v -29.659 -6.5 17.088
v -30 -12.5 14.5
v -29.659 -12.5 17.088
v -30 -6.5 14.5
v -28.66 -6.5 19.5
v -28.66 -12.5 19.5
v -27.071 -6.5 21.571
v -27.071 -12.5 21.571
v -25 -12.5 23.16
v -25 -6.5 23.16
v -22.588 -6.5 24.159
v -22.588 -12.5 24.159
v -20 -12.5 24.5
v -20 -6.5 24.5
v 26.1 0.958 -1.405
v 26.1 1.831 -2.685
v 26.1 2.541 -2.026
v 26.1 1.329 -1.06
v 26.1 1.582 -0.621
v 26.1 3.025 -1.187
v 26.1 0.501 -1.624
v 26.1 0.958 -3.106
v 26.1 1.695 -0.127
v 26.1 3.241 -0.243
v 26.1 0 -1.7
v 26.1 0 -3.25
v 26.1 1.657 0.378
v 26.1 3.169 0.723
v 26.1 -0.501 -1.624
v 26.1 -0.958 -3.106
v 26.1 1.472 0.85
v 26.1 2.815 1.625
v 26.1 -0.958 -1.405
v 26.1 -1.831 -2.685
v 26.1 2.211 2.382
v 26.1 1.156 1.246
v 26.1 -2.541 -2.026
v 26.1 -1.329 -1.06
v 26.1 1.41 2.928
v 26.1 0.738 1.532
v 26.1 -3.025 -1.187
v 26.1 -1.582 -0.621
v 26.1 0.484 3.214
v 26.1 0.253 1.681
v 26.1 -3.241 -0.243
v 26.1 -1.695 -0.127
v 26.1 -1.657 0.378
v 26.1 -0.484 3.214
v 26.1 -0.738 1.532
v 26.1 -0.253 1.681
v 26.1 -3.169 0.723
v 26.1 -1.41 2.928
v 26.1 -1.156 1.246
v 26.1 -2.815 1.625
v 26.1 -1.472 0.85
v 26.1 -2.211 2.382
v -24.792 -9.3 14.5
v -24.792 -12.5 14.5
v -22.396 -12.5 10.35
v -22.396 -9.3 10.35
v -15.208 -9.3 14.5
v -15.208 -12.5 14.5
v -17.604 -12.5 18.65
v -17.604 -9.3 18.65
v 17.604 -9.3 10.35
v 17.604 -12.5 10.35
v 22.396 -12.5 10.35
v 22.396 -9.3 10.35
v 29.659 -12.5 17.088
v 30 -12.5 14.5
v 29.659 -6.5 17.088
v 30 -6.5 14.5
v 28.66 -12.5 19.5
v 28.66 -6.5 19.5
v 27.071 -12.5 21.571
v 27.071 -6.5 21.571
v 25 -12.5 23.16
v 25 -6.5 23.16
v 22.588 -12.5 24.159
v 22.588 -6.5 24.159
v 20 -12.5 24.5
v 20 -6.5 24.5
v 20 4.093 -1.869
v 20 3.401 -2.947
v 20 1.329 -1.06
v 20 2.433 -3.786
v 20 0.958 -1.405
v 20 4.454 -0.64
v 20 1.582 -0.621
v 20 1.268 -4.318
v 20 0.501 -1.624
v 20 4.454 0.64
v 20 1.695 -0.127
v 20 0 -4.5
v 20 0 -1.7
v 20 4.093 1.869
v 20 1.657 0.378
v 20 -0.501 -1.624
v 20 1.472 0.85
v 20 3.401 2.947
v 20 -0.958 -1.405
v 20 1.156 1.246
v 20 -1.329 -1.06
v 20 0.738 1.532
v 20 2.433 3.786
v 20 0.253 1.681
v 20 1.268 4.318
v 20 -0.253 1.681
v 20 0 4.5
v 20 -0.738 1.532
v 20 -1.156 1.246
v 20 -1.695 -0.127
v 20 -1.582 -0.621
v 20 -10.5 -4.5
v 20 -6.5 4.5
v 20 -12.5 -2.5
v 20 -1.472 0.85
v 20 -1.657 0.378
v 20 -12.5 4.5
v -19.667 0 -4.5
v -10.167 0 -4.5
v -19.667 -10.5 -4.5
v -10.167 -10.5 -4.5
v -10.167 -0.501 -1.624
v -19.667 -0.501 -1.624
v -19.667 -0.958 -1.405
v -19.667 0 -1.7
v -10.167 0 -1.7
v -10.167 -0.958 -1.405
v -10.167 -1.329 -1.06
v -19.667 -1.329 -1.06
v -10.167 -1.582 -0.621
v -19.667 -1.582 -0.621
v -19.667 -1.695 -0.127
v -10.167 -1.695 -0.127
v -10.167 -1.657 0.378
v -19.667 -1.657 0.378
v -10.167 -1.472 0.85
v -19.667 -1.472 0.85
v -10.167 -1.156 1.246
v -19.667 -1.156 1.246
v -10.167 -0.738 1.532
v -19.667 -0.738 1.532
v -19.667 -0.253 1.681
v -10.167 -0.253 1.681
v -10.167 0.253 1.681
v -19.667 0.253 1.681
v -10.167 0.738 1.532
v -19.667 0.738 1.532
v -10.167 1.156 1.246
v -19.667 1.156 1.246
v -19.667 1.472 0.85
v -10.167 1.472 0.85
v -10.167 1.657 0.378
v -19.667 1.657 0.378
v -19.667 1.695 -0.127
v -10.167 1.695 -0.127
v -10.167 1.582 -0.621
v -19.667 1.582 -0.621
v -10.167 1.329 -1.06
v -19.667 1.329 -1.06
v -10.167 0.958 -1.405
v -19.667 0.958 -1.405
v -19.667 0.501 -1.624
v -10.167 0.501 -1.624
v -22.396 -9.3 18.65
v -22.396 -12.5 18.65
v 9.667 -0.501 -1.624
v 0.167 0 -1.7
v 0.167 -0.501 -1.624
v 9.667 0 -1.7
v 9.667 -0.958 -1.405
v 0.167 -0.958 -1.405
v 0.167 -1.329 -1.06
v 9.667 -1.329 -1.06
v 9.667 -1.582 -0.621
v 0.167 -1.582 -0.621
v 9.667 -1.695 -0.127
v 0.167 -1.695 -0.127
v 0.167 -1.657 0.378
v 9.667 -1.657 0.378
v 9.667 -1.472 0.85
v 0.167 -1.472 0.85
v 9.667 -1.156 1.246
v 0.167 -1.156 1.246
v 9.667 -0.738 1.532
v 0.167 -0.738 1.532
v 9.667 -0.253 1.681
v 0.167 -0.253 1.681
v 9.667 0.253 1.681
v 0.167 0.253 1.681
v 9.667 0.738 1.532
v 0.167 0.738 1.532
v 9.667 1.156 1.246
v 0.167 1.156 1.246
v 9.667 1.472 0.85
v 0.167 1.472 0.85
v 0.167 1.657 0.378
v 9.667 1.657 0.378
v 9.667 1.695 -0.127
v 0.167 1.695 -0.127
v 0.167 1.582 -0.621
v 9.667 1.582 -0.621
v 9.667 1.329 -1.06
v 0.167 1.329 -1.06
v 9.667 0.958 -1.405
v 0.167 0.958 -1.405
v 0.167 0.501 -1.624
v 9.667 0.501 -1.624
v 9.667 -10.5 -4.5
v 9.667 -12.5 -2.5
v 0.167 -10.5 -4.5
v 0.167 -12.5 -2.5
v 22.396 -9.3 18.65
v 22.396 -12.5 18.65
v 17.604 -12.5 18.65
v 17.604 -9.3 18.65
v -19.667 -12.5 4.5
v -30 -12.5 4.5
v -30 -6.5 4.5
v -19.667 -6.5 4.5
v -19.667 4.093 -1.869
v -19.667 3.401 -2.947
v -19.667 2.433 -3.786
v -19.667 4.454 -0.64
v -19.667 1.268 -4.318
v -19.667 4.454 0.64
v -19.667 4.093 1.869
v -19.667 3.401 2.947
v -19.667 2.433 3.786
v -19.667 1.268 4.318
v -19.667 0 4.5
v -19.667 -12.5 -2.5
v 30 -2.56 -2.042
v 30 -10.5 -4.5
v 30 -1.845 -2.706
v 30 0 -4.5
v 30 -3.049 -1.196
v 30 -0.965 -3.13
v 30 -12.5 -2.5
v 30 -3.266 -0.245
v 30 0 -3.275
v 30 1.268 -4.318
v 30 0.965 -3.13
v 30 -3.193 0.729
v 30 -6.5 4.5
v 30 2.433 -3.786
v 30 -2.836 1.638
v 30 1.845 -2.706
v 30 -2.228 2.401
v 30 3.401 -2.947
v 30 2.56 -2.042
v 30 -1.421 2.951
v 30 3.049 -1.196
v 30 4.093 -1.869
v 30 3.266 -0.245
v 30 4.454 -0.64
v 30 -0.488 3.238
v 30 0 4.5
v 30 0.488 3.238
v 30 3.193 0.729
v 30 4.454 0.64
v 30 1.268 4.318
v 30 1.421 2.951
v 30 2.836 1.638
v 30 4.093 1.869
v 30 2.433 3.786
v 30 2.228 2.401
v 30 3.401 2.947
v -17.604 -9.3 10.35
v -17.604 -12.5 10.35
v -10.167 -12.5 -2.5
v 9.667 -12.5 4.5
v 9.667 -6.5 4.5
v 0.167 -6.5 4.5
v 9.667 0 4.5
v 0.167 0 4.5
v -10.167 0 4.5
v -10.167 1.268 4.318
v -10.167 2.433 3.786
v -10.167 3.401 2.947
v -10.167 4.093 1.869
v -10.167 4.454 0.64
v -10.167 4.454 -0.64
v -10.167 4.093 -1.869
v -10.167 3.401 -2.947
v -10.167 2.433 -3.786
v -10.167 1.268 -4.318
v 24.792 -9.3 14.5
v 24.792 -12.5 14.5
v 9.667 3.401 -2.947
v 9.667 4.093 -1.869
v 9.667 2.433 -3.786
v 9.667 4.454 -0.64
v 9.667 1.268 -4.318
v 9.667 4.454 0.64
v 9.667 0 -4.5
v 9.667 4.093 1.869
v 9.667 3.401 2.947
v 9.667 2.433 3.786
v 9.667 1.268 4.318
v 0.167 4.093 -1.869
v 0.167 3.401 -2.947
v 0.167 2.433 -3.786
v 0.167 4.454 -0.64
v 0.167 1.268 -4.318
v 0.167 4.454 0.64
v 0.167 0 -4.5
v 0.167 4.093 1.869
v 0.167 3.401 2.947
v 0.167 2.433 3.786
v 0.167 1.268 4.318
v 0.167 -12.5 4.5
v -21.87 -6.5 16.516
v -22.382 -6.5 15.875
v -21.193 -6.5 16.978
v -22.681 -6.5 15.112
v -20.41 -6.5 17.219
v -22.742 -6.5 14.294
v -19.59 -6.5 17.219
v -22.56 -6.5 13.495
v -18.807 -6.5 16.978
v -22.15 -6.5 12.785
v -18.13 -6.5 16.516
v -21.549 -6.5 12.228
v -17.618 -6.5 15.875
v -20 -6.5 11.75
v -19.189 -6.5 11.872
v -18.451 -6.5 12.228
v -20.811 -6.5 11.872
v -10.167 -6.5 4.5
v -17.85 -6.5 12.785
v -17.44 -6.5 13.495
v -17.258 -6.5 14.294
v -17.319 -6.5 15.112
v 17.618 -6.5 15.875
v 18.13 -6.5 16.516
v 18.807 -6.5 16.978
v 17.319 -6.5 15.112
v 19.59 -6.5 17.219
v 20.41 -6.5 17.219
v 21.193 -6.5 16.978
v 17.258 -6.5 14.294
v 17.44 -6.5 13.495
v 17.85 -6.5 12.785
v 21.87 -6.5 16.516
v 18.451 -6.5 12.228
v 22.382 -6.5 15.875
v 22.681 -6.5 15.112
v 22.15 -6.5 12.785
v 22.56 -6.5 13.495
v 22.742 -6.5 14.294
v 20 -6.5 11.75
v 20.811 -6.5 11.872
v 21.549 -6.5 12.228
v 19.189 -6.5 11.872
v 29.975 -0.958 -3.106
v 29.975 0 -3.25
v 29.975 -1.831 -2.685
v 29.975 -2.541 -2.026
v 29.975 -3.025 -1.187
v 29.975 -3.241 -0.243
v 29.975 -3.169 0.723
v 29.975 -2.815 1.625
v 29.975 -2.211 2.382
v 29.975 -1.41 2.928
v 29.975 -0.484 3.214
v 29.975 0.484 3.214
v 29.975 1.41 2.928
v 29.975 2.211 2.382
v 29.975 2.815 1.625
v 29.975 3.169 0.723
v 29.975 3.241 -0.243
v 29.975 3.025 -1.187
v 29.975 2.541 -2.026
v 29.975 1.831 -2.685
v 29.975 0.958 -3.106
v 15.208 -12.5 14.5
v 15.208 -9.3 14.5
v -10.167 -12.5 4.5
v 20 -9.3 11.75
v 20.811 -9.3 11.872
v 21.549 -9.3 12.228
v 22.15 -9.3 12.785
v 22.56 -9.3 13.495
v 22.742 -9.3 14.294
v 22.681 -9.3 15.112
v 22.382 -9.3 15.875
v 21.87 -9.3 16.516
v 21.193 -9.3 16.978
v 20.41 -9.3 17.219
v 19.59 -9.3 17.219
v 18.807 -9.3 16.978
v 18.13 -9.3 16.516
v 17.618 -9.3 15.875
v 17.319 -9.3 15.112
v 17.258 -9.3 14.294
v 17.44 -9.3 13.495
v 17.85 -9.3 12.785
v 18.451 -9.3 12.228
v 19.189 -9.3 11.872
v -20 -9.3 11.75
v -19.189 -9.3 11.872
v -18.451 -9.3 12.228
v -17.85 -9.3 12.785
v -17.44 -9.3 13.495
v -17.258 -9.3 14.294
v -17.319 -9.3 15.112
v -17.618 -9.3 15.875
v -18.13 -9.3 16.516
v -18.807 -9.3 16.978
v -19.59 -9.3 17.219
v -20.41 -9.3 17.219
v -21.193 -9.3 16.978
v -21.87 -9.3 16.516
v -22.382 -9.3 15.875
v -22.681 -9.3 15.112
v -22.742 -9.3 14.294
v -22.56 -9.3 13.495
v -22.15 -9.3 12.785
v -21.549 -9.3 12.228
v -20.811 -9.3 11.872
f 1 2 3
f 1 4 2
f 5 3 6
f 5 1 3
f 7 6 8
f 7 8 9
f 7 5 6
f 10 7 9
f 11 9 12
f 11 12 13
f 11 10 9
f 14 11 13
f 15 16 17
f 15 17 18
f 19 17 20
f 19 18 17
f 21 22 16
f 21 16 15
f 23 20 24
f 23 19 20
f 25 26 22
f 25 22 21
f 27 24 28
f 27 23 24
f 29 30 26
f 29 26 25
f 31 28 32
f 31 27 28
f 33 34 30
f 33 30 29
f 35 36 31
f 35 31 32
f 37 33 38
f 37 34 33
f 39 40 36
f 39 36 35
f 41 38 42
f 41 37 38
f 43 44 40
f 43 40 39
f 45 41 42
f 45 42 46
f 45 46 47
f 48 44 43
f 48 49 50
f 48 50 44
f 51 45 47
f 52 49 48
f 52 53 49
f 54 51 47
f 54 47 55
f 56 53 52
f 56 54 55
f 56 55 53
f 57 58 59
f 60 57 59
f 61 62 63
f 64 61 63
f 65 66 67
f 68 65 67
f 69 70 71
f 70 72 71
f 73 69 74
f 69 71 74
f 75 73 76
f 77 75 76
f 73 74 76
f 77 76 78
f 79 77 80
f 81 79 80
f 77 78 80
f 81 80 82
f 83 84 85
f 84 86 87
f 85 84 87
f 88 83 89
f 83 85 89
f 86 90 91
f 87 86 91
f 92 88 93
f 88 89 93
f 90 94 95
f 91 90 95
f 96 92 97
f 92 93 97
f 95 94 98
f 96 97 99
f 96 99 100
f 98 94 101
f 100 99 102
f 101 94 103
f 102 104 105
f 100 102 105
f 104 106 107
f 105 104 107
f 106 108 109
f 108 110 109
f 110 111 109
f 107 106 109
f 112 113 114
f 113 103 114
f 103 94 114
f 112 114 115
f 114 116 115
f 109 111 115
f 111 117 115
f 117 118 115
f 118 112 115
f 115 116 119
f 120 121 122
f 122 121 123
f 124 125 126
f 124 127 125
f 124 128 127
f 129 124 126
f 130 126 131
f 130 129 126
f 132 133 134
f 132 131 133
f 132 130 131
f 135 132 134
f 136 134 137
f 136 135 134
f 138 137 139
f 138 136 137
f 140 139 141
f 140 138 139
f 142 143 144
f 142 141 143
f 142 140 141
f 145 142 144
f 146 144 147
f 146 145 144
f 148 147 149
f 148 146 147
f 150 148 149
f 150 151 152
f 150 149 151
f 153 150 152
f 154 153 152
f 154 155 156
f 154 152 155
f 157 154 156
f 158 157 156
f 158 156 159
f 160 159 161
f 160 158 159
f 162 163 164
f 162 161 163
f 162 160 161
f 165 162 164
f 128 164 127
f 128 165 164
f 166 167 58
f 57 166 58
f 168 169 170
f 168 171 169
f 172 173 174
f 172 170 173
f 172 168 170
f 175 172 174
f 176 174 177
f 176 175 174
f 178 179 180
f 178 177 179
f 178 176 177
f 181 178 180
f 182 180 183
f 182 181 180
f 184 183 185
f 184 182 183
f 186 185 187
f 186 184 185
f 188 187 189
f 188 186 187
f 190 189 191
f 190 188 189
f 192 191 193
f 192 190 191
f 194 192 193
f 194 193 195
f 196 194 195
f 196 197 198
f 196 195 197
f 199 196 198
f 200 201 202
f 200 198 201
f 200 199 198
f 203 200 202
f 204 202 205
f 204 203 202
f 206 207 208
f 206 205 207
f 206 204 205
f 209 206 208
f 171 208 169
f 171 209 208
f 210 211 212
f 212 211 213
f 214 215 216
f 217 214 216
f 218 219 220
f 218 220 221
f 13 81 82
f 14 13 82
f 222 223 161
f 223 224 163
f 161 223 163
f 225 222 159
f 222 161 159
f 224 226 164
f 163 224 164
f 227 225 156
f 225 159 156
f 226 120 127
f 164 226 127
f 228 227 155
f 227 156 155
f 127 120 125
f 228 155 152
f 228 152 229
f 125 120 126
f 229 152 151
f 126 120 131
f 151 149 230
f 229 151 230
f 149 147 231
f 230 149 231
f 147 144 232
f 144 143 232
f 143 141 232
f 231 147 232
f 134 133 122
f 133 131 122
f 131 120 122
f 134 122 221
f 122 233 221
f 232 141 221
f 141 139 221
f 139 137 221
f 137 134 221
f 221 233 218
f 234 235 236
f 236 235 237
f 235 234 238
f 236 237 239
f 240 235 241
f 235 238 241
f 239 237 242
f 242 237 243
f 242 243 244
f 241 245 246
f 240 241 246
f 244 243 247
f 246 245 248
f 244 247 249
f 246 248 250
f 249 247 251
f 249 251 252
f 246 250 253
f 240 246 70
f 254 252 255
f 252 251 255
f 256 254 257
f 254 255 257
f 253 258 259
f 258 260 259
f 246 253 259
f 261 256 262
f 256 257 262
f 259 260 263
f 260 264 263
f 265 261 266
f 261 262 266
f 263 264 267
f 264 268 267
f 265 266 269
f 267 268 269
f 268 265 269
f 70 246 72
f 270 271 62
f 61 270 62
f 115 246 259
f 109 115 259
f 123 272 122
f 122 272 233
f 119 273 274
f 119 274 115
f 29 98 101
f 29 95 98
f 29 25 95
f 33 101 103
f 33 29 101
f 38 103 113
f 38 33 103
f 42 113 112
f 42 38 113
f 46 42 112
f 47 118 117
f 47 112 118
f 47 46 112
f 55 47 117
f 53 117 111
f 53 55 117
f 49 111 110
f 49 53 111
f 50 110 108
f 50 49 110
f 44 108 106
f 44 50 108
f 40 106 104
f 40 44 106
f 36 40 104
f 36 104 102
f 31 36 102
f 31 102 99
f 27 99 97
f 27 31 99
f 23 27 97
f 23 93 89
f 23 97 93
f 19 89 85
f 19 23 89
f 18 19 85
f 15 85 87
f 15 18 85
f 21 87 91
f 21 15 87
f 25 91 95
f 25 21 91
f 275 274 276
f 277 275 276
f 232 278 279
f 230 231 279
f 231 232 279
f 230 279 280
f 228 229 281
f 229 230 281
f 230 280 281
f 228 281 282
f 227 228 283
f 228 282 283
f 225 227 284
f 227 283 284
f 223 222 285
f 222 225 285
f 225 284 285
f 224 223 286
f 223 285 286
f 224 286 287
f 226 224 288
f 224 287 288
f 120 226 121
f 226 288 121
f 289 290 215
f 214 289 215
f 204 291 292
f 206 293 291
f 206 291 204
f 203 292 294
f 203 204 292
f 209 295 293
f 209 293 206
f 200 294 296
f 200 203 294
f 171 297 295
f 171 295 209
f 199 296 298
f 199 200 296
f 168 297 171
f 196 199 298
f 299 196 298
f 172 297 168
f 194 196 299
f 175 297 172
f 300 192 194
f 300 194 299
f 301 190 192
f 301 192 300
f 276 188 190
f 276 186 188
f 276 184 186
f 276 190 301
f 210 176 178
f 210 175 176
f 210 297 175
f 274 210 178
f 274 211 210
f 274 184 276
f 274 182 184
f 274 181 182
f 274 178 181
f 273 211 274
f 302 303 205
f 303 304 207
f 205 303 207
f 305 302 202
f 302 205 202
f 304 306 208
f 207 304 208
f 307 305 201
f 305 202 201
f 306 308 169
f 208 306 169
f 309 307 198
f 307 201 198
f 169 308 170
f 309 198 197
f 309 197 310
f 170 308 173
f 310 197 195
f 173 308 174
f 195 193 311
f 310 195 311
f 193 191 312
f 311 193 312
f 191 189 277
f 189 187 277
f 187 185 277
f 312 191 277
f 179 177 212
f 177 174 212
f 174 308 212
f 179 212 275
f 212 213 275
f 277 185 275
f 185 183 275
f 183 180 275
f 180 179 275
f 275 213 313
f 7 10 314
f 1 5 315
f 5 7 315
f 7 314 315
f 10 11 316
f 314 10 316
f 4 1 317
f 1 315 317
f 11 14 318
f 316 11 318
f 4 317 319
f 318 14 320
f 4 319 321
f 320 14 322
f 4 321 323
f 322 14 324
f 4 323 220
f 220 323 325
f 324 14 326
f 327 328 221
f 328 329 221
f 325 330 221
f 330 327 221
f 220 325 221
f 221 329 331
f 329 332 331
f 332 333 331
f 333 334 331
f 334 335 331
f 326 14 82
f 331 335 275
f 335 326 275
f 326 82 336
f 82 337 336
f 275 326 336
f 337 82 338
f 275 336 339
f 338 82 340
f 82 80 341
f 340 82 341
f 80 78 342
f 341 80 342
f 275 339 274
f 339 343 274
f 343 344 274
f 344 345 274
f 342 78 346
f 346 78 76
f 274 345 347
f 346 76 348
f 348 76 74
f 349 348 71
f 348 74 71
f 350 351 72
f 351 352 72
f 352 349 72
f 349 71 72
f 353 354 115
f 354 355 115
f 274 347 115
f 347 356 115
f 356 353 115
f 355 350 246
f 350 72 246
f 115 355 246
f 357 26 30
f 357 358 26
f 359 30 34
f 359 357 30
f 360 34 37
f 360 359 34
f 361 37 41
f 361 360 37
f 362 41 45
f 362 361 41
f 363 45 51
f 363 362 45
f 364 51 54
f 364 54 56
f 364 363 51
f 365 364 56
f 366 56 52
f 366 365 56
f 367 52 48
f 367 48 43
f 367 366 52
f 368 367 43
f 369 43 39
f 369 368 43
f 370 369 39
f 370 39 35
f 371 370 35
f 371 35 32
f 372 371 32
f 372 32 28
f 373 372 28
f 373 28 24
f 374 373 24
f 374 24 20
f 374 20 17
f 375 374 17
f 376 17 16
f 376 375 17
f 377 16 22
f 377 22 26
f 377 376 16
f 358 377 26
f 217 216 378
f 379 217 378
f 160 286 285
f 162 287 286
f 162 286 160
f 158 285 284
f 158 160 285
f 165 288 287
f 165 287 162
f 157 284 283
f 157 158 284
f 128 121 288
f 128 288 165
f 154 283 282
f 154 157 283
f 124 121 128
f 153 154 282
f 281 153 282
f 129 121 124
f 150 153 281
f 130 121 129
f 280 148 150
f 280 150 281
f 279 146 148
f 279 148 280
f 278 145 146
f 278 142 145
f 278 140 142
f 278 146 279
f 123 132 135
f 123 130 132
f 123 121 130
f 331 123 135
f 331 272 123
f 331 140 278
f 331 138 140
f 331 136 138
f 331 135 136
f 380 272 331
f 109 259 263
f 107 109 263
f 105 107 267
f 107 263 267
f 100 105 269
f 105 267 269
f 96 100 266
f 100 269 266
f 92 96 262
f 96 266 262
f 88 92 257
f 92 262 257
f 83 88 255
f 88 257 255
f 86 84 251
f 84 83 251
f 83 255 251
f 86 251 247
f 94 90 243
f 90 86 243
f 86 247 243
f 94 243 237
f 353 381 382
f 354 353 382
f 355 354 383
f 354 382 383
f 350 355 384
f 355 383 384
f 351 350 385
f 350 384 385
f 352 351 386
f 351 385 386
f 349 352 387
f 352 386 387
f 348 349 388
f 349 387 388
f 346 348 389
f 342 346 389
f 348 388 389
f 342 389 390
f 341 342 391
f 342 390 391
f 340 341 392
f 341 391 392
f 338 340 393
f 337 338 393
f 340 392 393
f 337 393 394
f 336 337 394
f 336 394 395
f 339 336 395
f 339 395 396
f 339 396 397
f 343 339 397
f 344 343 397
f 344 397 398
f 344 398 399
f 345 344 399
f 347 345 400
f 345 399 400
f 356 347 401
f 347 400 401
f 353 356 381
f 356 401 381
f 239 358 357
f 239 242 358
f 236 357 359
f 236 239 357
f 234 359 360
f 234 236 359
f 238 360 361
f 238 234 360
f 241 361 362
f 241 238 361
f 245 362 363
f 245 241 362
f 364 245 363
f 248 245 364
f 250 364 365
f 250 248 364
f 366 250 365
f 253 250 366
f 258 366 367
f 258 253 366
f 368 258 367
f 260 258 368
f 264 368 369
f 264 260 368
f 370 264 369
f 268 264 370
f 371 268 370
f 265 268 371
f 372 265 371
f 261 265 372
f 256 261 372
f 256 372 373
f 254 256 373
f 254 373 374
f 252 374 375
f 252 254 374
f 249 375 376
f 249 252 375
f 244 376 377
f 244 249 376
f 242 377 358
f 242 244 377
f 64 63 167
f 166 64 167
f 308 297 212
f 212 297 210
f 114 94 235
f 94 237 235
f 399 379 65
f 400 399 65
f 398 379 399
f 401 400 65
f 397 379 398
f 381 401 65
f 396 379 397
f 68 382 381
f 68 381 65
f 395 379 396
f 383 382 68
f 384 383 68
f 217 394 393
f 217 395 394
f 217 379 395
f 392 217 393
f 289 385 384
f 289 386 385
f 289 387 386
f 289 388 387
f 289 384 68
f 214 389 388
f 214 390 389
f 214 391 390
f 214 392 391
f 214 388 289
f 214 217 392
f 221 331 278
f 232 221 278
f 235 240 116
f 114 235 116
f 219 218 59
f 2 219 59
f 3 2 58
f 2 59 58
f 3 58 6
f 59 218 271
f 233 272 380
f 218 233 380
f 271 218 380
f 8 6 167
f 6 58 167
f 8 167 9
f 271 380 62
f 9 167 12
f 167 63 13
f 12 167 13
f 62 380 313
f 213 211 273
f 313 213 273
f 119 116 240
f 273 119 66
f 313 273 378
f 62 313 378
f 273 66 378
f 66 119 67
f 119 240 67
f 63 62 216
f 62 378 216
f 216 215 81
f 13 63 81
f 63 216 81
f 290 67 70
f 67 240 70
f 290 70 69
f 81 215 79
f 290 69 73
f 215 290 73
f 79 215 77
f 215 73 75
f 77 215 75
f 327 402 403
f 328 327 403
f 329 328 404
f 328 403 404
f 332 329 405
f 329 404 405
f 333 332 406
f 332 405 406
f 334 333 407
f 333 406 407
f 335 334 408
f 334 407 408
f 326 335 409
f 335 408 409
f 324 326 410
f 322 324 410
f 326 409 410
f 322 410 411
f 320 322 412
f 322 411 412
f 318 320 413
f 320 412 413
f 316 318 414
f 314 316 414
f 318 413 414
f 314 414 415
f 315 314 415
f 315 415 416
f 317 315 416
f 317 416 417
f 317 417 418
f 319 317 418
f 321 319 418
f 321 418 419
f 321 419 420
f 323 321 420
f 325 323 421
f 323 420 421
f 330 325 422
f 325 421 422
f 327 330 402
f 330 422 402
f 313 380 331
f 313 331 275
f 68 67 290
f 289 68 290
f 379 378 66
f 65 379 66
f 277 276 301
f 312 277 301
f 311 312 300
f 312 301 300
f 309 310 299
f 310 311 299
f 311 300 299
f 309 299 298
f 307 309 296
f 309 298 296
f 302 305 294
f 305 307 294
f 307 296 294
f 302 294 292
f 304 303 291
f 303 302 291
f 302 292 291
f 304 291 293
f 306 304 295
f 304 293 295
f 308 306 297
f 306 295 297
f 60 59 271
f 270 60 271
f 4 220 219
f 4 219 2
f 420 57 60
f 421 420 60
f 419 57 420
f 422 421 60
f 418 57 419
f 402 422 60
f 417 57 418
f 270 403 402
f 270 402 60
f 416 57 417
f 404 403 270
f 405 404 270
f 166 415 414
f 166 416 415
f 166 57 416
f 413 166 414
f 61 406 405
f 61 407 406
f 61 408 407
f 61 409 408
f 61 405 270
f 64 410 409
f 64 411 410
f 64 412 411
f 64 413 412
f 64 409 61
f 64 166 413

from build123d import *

# Parameters (mm, degrees)
BOSS_EXTRUDE1_DEPTH = 30
CHAMFER1_SIZE       = 2
FILLET1_R           = 10
SKETCH2_W           = 10.333333333
SKETCH2_H           = 9
SKETCH2_W_2         = 10.333333334
CUT_EXTRUDE1_DEPTH  = 43.299527184
CUT_EXTRUDE2_DEPTH  = 3.2
SKETCH7_R           = 2.75
CUT_EXTRUDE3_DEPTH  = 2.8


with BuildPart() as part:
    # Sketch1 → Boss-Extrude1 (new, symmetric)
    with BuildSketch(Plane(origin=(0, 0, 0), x_dir=(0, 0, -1), z_dir=(1, 0, 0))):
        with BuildLine():
            Line((4.5, 0), (4.5, -12.5))
            Line((4.5, -12.5), (-24.5, -12.5))
            Line((-24.5, -12.5), (-24.5, -6.5))
            Line((-24.5, -6.5), (-4.5, -6.5))
            Line((-4.5, -6.5), (-4.5, 0))
            ThreePointArc((-4.5, 0), (0, 4.5), (4.5, 0))
        make_face()
    extrude(amount=BOSS_EXTRUDE1_DEPTH, both=True)

    # Chamfer1
    chamfer1_edges = [part.edges().sort_by_distance(p)[0] for p in [
        (0, -12.5, -4.5),
    ]]
    chamfer(chamfer1_edges, length=CHAMFER1_SIZE)

    # Fillet1
    fillet1_edges = [part.edges().sort_by_distance(p)[0] for p in [
        (-30, -9.5, 24.5),
        (30, -9.5, 24.5),
    ]]
    fillet(fillet1_edges, radius=FILLET1_R)

    # Sketch2 → Cut-Extrude1 (cut, through all)
    with BuildSketch(Plane.XZ.offset(12.5)):
        with Locations((-24.833333334, 0)):
            Rectangle(SKETCH2_W, SKETCH2_H)
        with Locations((-5, 0)):
            Rectangle(SKETCH2_W_2, SKETCH2_H)
        with Locations((14.833333334, 0)):
            Rectangle(SKETCH2_W, SKETCH2_H)
    extrude(amount=-CUT_EXTRUDE1_DEPTH, mode=Mode.SUBTRACT)

    # Sketch5 → CBORE for M3 Hex Socket Head Cap Screw1 (revolve, cut)
    with BuildSketch(Plane(origin=(30, 0, 0), x_dir=(0, 0, -1), z_dir=(0, 1, 0))):
        Polygon((0, 0), (0, 60), (1.7, 60), (1.7, 3.9), (3.25, 3.9), (3.25, 0.025), (3.275, 0), align=None)
    revolve(axis=Axis((36.35, 0, 0), (-1, 0, 0)), mode=Mode.SUBTRACT)

    # Sketch6 → Cut-Extrude2 (cut)
    with BuildSketch(Plane.XZ.offset(12.5)):
        Polygon((24.792007234, 14.5), (22.396003617, 18.65), (17.603996383, 18.65), (15.207992766, 14.5), (17.603996383, 10.35), (22.396003617, 10.35), align=None)
        Polygon((-15.207992766, 14.5), (-17.603996383, 18.65), (-22.396003617, 18.65), (-24.792007234, 14.5), (-22.396003617, 10.35), (-17.603996383, 10.35), align=None)
    extrude(amount=-CUT_EXTRUDE2_DEPTH, mode=Mode.SUBTRACT)

    # Sketch7 → Cut-Extrude3 (cut)
    with BuildSketch(Plane.XZ.offset(9.3)):
        with Locations(Location((-20, 14.5, 0), (0, 0, 270))):
            Circle(SKETCH7_R)
        with Locations(Location((20, 14.5, 0), (0, 0, 270))):
            Circle(SKETCH7_R)
    extrude(amount=-CUT_EXTRUDE3_DEPTH, mode=Mode.SUBTRACT)


solid = part.part
